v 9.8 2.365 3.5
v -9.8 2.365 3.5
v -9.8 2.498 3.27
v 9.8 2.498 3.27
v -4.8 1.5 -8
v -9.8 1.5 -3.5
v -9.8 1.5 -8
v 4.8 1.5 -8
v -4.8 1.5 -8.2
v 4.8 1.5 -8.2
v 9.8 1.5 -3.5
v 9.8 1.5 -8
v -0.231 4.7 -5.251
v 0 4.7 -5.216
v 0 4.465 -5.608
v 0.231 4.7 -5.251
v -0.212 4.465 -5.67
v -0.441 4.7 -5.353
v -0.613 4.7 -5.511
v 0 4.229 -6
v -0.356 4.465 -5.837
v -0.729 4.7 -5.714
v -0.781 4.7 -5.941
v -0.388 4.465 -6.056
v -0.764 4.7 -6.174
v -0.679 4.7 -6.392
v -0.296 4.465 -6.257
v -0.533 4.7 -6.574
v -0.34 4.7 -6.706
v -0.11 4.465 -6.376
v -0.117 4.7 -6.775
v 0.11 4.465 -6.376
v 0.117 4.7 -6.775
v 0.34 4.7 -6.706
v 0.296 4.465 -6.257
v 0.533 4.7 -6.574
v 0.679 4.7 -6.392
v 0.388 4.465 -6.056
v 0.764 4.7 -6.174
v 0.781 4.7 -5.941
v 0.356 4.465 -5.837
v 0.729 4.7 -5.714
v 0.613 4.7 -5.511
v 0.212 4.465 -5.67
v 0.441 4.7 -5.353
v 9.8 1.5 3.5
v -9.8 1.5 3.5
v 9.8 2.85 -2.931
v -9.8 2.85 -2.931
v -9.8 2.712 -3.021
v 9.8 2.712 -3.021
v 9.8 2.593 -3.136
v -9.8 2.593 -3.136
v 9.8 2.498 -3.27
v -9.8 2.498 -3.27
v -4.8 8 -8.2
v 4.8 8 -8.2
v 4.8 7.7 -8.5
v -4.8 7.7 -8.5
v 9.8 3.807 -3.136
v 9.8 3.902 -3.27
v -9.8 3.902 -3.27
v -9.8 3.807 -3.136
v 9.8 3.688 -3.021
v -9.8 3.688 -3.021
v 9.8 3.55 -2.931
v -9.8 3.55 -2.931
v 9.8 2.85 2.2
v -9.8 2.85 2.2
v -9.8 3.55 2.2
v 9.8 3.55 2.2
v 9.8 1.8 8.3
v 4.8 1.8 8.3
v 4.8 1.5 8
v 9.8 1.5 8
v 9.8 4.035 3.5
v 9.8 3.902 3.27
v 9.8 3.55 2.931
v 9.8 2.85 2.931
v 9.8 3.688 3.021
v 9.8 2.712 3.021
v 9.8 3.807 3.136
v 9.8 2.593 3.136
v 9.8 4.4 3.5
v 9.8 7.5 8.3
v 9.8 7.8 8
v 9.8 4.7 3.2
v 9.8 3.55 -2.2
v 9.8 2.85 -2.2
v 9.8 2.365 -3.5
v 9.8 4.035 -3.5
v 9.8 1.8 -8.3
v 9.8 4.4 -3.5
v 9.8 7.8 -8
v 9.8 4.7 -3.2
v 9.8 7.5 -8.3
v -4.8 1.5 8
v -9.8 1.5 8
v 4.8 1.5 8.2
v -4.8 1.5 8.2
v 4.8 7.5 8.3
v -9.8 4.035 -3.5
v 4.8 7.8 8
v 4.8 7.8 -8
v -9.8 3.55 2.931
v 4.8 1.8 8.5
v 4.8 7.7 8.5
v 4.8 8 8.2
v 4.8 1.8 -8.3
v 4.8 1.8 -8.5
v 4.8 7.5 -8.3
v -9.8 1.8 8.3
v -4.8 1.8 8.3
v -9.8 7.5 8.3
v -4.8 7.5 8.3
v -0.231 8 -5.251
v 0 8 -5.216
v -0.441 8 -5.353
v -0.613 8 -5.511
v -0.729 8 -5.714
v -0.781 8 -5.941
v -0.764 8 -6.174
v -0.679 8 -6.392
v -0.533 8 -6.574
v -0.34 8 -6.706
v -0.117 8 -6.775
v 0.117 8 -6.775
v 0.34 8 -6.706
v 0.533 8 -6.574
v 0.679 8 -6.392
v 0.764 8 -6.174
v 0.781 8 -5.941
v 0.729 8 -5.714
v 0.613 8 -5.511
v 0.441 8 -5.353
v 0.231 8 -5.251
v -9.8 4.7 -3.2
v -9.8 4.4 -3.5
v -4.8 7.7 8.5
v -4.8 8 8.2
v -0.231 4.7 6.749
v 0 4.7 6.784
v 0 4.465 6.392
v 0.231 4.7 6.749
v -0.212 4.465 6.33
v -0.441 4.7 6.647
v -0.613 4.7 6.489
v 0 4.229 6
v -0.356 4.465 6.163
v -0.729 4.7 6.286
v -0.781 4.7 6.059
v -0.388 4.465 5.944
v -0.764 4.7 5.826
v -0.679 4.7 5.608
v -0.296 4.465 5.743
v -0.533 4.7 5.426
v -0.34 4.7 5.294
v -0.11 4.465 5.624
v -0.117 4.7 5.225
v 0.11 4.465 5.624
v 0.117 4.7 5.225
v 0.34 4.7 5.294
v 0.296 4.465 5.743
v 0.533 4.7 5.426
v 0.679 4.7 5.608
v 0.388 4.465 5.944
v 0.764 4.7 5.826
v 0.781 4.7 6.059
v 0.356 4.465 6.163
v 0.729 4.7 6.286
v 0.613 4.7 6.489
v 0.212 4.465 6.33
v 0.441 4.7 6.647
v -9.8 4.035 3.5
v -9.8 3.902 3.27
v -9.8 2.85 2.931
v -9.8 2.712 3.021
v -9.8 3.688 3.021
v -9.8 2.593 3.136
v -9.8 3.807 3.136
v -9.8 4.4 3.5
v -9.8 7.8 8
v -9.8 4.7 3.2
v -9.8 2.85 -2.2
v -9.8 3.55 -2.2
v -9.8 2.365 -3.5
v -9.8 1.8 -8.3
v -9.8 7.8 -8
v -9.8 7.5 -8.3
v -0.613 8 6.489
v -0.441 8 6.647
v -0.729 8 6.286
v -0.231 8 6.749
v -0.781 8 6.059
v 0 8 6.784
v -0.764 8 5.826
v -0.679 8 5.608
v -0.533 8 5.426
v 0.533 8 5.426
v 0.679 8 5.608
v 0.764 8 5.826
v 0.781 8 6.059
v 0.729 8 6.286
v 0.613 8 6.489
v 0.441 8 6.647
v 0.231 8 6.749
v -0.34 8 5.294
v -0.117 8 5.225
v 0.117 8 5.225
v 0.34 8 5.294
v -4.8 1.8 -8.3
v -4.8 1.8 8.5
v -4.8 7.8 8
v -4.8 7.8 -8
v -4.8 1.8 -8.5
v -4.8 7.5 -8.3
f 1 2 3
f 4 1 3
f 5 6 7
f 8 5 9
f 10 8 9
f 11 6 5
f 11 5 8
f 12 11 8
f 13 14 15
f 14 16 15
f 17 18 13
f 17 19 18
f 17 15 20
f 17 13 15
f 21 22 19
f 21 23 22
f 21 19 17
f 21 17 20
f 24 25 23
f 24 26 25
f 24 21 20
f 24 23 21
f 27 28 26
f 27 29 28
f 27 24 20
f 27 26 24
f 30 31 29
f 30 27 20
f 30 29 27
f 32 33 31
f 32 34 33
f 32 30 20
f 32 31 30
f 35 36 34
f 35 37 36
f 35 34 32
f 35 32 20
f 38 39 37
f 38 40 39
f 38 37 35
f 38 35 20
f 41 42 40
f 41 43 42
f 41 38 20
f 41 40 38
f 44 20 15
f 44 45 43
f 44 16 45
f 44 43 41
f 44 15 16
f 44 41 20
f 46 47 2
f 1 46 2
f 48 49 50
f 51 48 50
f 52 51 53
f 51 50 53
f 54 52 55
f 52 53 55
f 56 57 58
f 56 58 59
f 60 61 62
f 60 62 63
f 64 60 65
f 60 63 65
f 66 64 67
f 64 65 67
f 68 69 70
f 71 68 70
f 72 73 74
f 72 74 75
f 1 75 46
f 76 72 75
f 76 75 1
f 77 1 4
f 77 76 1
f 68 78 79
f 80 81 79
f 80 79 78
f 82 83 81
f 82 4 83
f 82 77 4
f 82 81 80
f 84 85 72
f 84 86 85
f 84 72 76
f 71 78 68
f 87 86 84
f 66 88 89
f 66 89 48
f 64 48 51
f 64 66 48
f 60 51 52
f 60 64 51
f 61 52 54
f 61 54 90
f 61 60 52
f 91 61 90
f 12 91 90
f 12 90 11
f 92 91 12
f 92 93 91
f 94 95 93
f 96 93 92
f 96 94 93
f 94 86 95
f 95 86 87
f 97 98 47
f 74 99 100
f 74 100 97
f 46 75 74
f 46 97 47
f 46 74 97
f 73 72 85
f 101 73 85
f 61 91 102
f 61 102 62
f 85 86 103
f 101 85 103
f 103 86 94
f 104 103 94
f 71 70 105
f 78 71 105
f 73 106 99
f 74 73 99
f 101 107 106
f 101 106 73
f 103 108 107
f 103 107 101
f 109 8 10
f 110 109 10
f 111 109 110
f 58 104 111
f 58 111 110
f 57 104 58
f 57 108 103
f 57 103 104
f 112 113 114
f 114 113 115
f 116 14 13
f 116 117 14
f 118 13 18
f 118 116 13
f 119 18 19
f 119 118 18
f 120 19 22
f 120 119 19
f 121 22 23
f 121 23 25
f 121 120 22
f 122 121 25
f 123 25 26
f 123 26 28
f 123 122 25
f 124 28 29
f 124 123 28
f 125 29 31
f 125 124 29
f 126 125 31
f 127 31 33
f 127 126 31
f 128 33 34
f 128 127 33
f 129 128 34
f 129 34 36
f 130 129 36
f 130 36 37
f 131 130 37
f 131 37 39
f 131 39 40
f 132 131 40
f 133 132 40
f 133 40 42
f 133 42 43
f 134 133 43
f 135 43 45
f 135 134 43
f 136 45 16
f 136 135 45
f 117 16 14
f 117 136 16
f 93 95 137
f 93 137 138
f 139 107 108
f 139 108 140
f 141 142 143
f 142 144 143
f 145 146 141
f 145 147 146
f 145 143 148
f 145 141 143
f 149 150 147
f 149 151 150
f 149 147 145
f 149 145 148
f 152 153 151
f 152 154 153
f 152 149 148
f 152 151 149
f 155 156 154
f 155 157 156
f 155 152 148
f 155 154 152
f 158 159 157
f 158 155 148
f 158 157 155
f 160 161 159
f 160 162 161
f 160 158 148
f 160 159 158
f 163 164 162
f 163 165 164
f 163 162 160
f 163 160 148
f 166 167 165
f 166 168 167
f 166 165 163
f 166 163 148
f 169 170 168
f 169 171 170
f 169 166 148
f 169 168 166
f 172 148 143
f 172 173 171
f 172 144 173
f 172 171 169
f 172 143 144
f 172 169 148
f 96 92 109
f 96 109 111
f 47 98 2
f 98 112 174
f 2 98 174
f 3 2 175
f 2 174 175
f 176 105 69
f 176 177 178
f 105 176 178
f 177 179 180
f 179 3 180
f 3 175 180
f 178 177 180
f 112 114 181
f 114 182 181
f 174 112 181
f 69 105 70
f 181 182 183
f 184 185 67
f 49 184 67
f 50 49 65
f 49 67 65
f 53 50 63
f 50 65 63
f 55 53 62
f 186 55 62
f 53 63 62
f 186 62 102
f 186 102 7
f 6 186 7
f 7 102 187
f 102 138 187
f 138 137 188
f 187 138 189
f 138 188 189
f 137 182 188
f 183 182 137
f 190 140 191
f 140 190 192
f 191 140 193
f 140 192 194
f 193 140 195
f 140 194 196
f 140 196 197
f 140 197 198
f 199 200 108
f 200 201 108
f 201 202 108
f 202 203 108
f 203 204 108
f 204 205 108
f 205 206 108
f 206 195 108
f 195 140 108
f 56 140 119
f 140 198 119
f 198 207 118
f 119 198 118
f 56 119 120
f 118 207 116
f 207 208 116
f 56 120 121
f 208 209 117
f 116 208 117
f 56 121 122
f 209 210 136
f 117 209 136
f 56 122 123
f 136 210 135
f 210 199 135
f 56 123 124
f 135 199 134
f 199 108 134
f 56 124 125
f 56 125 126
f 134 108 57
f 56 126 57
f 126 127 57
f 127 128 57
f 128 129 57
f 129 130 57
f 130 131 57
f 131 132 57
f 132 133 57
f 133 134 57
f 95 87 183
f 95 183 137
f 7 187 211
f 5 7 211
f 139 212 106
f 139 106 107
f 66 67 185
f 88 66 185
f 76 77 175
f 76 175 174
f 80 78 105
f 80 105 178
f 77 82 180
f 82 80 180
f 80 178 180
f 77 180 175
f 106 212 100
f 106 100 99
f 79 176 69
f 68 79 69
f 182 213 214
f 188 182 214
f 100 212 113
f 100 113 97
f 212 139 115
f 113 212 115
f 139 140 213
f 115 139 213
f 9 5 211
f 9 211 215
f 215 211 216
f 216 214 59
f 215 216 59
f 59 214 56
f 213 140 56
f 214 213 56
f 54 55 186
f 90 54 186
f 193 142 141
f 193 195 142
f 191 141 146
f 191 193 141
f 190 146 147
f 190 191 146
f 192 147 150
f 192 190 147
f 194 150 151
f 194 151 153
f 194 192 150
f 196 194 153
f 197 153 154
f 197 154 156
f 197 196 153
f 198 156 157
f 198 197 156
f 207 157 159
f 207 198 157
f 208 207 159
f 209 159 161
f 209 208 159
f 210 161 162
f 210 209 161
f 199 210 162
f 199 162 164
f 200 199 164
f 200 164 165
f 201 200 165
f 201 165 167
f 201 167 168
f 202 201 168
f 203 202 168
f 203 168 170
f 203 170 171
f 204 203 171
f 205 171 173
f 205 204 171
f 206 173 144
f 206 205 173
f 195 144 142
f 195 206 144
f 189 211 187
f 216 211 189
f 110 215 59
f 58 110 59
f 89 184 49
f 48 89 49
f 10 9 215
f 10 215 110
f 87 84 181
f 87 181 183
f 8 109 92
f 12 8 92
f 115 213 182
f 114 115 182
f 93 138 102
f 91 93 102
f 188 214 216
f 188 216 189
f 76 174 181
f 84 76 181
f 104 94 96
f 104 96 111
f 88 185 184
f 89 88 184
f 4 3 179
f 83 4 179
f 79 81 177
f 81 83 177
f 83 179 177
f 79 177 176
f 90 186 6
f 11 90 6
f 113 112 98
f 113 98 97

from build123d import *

# Parameters (mm, degrees)
SKETCH1_W               = 16.6
SKETCH1_H               = 6.3
BOSS_EXTRUDE1_DEPTH     = 9.8
SKETCH2_W               = 17
SKETCH2_H               = 6.5
BOSS_EXTRUDE2_DEPTH     = 4.8
CUT_EXTRUDE2_DEPTH      = 16.241062955
CUT_EXTRUDE2_DEPTH_BACK = 16.241062955
CHAMFER1_SIZE           = 0.3
CHAMFER2_SIZE           = 0.3
CHAMFER3_SIZE           = 0.3
CHAMFER4_SIZE           = 0.3
LPATTERN1_COUNT         = 2
LPATTERN1_PITCH         = 12


with BuildPart() as part:
    # Sketch1 → Boss-Extrude1 (new, symmetric)
    with BuildSketch(Plane(origin=(0, 0, 0), x_dir=(0, 0, -1), z_dir=(1, 0, 0))):
        with Locations((0, 4.65)):
            Rectangle(SKETCH1_W, SKETCH1_H)
    extrude(amount=BOSS_EXTRUDE1_DEPTH, both=True)

    # Sketch2 → Boss-Extrude2 (add, symmetric)
    with BuildSketch(Plane(origin=(0, 0, 0), x_dir=(0, 0, -1), z_dir=(1, 0, 0))):
        with Locations((0, 4.75)):
            Rectangle(SKETCH2_W, SKETCH2_H)
    extrude(amount=BOSS_EXTRUDE2_DEPTH, both=True)

    # Sketch3 → Cut-Extrude2 (cut, two sides: drawn at the far end of the back side and taken through both)
    with BuildSketch(Plane(origin=(0, 0, 0), x_dir=(0, 0, -1), z_dir=(1, 0, 0)).offset(-CUT_EXTRUDE2_DEPTH_BACK)):
        with BuildLine():
            Line((-3.2, 4.7), (3.2, 4.7))
            Line((3.2, 4.7), (3.5, 4.4))
            Line((3.5, 4.4), (3.5, 4.034892917))
            Line((3.5, 4.034892917), (3.27, 3.902102355))
            ThreePointArc((3.27, 3.902102355), (3.075750359, 3.750022453), (2.931347317, 3.55))
            Line((2.931347317, 3.55), (2.2, 3.55))
            Line((2.2, 3.55), (2.2, 2.85))
            Line((2.2, 2.85), (2.931347317, 2.85))
            ThreePointArc((2.931347317, 2.85), (3.075750359, 2.649977547), (3.27, 2.497897645))
            Line((3.27, 2.497897645), (3.5, 2.365107083))
            Line((3.5, 2.365107083), (3.5, 0))
            Line((3.5, 0), (-3.5, 0))
            Line((-3.5, 0), (-3.5, 2.365107083))
            Line((-3.5, 2.365107083), (-3.27, 2.497897645))
            ThreePointArc((-3.27, 2.497897645), (-3.075750359, 2.649977547), (-2.931347317, 2.85))
            Line((-2.931347317, 2.85), (-2.2, 2.85))
            Line((-2.2, 2.85), (-2.2, 3.55))
            Line((-2.2, 3.55), (-2.931347317, 3.55))
            ThreePointArc((-2.931347317, 3.55), (-3.075750359, 3.750022453), (-3.27, 3.902102355))
            Line((-3.27, 3.902102355), (-3.5, 4.034892917))
            Line((-3.5, 4.034892917), (-3.5, 4.4))
            Line((-3.5, 4.4), (-3.2, 4.7))
        make_face()
    extrude(amount=CUT_EXTRUDE2_DEPTH + CUT_EXTRUDE2_DEPTH_BACK, mode=Mode.SUBTRACT)

    # Chamfer1
    chamfer1_edges = [part.edges().sort_by_distance(p)[0] for p in [
        (-7.3, 7.8, 8.3),
        (-7.3, 7.8, -8.3),
        (7.3, 7.8, 8.3),
        (7.3, 7.8, -8.3),
    ]]
    chamfer(chamfer1_edges, length=CHAMFER1_SIZE)

    # Chamfer2
    chamfer2_edges = [part.edges().sort_by_distance(p)[0] for p in [
        (0, 8, 8.5),
        (0, 8, -8.5),
    ]]
    chamfer(chamfer2_edges, length=CHAMFER2_SIZE)

    # Chamfer3
    chamfer3_edges = [part.edges().sort_by_distance(p)[0] for p in [
        (-7.3, 1.5, -8.3),
        (-7.3, 1.5, 8.3),
        (7.3, 1.5, -8.3),
        (7.3, 1.5, 8.3),
    ]]
    chamfer(chamfer3_edges, length=CHAMFER3_SIZE)

    # Chamfer4
    chamfer4_edges = [part.edges().sort_by_distance(p)[0] for p in [
        (0, 1.5, 8.5),
        (0, 1.5, -8.5),
    ]]
    chamfer(chamfer4_edges, length=CHAMFER4_SIZE)

    # Sketch4 → Tap1 (revolve, cut)
    with BuildSketch(Plane(origin=(0, 8, -6), x_dir=(0, 0, 1), z_dir=(1, 0, 0))):
        Polygon((0, 0), (0, 3.770774295), (0.7835, 3.3), (0.7835, 0), align=None)
    tap1 = revolve(axis=Axis((0, 8, -6), (0, -1, 0)), mode=Mode.SUBTRACT)

    # LPattern1: Tap1 ×2
    with Locations(*[(0, 0, i * LPATTERN1_PITCH) for i in range(1, LPATTERN1_COUNT)]):
        add(tap1, mode=Mode.SUBTRACT)


solid = part.part
